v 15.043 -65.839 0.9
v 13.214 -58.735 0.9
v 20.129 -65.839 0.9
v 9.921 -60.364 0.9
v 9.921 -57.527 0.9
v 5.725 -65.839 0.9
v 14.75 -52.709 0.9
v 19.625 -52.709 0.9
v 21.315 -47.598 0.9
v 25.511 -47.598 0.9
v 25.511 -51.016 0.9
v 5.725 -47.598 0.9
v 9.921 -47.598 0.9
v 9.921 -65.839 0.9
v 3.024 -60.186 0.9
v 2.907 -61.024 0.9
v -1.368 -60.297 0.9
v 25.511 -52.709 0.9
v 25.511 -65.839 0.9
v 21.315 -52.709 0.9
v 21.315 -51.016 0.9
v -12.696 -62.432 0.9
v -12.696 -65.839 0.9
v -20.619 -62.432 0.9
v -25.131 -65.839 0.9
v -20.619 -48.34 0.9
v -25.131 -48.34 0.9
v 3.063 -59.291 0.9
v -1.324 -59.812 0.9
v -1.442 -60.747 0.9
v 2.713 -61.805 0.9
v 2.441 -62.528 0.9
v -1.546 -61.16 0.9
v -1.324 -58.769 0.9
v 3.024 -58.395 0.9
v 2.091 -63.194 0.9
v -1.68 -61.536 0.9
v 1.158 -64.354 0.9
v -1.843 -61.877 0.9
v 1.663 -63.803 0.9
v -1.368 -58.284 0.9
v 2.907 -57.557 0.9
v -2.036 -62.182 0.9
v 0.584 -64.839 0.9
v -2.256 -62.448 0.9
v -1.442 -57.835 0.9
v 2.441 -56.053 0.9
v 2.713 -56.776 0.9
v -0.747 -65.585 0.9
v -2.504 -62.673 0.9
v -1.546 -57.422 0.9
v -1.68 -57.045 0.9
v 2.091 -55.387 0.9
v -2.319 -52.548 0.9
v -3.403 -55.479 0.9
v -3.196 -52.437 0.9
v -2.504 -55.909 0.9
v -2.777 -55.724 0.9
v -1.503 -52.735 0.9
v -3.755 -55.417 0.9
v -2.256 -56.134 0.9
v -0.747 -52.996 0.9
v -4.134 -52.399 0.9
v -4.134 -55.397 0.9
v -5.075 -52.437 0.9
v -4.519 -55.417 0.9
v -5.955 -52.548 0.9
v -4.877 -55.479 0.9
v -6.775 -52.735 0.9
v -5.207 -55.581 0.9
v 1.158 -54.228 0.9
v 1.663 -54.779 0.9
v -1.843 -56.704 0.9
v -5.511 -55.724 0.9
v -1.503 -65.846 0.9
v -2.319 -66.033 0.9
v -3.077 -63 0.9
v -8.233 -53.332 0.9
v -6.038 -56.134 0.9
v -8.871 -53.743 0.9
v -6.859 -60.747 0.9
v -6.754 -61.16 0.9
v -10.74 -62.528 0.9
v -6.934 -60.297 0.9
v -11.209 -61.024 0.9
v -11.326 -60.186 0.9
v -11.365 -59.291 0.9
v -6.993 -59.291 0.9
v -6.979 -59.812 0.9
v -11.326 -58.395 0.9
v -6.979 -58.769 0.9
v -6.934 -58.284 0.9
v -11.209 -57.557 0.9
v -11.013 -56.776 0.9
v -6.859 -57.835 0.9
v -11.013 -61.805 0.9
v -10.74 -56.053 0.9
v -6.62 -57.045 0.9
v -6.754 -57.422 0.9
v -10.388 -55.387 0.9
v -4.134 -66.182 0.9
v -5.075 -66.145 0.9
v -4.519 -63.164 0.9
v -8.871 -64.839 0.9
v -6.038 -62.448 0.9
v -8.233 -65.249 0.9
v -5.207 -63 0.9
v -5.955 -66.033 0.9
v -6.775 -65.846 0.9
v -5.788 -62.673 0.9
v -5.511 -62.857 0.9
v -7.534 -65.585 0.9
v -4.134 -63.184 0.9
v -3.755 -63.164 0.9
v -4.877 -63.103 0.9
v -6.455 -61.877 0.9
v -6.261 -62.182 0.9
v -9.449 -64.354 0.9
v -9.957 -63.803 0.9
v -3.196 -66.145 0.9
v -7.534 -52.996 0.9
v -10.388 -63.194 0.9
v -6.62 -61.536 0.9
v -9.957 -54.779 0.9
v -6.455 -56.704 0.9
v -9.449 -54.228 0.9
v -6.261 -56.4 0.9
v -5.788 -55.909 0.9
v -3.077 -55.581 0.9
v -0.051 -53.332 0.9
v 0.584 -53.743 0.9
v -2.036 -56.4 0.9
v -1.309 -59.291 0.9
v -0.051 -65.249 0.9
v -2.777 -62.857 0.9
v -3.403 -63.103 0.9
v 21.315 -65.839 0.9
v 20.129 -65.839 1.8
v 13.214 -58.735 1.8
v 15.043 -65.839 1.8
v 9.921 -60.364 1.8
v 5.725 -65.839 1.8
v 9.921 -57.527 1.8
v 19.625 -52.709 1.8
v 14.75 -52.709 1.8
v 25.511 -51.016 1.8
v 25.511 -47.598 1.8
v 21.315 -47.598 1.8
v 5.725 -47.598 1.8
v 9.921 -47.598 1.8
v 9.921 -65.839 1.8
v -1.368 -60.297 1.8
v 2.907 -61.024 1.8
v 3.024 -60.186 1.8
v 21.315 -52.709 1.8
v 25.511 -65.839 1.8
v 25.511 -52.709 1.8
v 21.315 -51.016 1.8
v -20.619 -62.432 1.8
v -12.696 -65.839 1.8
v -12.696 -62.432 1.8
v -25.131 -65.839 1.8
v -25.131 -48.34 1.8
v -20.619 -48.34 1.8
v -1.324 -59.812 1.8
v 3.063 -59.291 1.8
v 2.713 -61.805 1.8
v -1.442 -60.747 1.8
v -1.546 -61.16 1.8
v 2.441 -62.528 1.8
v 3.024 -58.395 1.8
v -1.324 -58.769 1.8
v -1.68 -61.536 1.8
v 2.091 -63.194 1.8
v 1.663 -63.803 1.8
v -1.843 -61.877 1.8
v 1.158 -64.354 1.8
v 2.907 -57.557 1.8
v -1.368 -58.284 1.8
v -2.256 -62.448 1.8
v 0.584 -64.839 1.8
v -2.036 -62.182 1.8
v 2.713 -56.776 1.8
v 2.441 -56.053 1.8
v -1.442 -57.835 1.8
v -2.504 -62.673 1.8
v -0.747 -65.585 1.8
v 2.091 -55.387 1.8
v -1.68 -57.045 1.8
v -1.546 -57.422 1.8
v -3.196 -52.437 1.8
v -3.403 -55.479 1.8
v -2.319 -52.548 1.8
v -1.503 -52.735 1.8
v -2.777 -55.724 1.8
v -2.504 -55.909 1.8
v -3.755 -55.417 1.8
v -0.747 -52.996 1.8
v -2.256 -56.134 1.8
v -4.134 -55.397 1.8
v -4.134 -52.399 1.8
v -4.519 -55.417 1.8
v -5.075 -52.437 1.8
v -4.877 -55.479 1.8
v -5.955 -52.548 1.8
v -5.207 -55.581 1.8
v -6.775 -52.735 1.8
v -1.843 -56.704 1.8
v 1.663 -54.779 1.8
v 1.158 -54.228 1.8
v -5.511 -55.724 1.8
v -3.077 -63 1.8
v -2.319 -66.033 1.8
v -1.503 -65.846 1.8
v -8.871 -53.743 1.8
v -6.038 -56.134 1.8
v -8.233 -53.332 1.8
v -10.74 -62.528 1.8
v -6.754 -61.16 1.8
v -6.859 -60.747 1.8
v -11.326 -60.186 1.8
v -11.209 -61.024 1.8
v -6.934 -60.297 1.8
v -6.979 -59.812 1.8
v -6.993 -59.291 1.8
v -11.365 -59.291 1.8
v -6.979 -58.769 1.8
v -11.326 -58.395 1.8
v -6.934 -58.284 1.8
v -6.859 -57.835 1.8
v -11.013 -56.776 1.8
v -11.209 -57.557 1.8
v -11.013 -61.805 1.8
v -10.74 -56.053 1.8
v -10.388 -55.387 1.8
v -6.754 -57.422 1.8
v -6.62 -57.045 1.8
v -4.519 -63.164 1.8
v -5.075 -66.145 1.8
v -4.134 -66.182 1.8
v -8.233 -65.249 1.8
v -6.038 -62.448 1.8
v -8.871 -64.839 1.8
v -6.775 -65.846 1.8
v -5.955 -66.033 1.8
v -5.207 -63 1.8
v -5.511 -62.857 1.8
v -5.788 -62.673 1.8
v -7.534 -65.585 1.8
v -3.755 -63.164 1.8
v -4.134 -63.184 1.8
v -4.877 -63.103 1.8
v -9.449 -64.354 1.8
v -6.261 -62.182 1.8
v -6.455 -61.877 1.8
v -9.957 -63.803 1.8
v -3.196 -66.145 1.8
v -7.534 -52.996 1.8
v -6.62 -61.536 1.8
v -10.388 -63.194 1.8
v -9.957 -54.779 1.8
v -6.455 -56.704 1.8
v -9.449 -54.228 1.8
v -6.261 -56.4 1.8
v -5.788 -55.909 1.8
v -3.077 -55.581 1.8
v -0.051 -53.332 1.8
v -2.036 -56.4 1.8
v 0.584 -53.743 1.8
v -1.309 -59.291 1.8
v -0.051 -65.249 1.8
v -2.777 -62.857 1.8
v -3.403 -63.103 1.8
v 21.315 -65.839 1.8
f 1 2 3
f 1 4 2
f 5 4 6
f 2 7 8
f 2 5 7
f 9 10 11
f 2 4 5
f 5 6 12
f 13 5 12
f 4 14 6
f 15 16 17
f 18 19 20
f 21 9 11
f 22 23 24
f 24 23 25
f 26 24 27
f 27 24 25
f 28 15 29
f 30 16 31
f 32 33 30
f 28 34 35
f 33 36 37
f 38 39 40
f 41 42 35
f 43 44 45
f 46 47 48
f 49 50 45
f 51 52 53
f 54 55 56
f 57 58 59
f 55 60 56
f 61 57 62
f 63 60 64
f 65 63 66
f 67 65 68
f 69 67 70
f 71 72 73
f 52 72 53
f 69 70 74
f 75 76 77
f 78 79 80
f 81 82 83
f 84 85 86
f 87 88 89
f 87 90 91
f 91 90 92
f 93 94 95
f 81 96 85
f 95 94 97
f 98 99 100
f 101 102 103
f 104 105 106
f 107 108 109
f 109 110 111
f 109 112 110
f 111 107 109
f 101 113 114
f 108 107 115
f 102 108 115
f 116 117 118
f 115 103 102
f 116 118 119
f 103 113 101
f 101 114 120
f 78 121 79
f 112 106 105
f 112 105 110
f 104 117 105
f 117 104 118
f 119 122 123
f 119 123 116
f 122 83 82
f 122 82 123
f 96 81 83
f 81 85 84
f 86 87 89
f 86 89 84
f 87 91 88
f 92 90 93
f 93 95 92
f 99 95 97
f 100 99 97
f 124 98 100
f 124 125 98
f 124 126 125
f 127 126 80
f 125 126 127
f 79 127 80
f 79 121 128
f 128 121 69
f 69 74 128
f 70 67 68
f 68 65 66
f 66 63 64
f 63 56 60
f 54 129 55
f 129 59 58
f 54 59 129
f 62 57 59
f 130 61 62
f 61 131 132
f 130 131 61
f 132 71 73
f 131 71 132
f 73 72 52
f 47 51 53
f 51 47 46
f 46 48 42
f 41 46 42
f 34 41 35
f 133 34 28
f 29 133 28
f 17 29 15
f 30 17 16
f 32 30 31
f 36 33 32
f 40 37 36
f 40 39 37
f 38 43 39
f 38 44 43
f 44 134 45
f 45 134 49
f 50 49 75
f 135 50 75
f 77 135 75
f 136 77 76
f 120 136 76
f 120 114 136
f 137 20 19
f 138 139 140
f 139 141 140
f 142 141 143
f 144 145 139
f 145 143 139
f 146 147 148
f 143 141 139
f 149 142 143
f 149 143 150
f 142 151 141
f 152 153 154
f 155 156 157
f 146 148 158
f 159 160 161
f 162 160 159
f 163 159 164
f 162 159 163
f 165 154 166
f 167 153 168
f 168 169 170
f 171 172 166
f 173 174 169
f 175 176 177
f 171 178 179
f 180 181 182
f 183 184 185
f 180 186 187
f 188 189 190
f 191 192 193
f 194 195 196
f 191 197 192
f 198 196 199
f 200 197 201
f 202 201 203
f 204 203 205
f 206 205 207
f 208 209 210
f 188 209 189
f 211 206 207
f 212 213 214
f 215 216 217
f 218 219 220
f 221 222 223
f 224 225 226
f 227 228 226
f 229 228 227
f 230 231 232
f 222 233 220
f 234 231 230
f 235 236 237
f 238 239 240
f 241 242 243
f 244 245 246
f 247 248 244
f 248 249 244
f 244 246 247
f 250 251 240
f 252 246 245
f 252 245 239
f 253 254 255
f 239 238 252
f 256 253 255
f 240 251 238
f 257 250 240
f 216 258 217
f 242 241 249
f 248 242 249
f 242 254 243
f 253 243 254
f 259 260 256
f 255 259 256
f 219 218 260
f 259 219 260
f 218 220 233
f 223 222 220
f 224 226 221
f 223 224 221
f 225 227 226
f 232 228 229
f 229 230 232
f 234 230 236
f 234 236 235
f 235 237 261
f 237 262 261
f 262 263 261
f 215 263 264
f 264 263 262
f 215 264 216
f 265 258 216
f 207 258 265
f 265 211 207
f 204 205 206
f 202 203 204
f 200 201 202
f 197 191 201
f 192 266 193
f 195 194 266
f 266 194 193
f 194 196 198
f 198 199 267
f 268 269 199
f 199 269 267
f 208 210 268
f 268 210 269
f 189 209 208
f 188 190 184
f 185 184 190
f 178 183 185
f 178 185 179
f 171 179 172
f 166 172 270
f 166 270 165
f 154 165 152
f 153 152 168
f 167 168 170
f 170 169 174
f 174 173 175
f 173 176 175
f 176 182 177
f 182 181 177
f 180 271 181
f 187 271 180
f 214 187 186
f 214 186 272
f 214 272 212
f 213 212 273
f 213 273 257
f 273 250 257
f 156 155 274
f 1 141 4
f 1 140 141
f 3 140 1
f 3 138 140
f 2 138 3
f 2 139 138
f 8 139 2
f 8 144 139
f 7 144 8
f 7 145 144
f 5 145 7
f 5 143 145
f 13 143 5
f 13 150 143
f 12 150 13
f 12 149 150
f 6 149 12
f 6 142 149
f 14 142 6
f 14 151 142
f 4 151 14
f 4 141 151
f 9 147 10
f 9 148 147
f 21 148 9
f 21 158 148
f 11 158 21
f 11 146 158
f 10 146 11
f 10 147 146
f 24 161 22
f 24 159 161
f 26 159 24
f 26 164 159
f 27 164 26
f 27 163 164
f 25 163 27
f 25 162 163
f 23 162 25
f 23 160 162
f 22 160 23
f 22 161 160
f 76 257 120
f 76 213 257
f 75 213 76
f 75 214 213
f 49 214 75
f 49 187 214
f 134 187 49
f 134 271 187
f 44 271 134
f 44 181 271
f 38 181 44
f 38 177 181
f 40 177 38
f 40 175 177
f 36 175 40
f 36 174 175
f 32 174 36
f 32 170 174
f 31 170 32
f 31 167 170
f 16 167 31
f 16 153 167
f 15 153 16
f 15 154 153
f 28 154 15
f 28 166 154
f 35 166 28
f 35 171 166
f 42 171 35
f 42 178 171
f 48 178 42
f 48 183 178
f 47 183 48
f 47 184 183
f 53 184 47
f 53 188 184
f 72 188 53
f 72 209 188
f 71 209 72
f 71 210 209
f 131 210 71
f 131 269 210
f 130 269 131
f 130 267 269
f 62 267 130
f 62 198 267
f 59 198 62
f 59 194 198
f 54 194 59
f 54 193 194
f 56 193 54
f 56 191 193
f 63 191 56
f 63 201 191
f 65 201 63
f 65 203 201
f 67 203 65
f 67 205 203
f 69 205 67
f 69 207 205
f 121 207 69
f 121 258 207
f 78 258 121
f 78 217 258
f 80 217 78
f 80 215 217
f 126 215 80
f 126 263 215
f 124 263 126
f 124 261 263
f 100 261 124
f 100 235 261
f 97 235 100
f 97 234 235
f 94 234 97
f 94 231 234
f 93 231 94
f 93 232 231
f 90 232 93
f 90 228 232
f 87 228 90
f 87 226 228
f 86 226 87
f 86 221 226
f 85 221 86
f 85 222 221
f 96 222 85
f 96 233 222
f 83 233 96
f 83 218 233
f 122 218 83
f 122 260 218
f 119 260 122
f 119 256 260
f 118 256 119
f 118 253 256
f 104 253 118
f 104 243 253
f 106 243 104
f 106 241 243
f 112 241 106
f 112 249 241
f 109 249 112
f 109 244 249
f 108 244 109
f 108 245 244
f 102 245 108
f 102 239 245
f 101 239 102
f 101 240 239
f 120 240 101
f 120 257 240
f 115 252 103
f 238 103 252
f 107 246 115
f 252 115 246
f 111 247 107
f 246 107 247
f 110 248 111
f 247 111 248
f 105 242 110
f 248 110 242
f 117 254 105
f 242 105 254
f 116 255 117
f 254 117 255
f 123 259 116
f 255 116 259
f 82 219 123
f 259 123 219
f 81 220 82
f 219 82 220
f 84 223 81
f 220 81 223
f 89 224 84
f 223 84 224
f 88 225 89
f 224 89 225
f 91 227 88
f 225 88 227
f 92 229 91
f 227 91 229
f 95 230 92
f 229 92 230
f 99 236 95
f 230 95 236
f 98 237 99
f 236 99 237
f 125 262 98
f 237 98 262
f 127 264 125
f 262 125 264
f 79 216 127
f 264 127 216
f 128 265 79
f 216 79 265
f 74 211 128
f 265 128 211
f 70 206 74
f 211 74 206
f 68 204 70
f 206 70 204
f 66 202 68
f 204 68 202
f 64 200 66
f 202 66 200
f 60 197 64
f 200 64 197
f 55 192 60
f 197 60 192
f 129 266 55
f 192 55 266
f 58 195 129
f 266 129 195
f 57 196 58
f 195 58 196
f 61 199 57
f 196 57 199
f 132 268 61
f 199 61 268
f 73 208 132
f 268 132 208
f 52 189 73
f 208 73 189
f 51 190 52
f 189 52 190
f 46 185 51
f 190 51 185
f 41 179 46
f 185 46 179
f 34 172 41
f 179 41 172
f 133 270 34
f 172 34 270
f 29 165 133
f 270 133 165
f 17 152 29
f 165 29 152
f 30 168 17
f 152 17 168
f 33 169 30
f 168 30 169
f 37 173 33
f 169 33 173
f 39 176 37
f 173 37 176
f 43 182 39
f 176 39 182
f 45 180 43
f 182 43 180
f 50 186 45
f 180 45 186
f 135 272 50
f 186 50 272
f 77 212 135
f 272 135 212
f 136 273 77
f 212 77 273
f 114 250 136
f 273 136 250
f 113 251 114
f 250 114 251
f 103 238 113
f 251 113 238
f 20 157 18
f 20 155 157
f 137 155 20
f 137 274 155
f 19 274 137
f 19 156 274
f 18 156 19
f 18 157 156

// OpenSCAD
$fn = 48;
  // English (below bottom hole)
  translate([0, -57.100, 0.900]) linear_extrude(height=0.900) text("Loki", size=17.284, halign="center", valign="center", font="Helvetica Neue:style=Bold");
